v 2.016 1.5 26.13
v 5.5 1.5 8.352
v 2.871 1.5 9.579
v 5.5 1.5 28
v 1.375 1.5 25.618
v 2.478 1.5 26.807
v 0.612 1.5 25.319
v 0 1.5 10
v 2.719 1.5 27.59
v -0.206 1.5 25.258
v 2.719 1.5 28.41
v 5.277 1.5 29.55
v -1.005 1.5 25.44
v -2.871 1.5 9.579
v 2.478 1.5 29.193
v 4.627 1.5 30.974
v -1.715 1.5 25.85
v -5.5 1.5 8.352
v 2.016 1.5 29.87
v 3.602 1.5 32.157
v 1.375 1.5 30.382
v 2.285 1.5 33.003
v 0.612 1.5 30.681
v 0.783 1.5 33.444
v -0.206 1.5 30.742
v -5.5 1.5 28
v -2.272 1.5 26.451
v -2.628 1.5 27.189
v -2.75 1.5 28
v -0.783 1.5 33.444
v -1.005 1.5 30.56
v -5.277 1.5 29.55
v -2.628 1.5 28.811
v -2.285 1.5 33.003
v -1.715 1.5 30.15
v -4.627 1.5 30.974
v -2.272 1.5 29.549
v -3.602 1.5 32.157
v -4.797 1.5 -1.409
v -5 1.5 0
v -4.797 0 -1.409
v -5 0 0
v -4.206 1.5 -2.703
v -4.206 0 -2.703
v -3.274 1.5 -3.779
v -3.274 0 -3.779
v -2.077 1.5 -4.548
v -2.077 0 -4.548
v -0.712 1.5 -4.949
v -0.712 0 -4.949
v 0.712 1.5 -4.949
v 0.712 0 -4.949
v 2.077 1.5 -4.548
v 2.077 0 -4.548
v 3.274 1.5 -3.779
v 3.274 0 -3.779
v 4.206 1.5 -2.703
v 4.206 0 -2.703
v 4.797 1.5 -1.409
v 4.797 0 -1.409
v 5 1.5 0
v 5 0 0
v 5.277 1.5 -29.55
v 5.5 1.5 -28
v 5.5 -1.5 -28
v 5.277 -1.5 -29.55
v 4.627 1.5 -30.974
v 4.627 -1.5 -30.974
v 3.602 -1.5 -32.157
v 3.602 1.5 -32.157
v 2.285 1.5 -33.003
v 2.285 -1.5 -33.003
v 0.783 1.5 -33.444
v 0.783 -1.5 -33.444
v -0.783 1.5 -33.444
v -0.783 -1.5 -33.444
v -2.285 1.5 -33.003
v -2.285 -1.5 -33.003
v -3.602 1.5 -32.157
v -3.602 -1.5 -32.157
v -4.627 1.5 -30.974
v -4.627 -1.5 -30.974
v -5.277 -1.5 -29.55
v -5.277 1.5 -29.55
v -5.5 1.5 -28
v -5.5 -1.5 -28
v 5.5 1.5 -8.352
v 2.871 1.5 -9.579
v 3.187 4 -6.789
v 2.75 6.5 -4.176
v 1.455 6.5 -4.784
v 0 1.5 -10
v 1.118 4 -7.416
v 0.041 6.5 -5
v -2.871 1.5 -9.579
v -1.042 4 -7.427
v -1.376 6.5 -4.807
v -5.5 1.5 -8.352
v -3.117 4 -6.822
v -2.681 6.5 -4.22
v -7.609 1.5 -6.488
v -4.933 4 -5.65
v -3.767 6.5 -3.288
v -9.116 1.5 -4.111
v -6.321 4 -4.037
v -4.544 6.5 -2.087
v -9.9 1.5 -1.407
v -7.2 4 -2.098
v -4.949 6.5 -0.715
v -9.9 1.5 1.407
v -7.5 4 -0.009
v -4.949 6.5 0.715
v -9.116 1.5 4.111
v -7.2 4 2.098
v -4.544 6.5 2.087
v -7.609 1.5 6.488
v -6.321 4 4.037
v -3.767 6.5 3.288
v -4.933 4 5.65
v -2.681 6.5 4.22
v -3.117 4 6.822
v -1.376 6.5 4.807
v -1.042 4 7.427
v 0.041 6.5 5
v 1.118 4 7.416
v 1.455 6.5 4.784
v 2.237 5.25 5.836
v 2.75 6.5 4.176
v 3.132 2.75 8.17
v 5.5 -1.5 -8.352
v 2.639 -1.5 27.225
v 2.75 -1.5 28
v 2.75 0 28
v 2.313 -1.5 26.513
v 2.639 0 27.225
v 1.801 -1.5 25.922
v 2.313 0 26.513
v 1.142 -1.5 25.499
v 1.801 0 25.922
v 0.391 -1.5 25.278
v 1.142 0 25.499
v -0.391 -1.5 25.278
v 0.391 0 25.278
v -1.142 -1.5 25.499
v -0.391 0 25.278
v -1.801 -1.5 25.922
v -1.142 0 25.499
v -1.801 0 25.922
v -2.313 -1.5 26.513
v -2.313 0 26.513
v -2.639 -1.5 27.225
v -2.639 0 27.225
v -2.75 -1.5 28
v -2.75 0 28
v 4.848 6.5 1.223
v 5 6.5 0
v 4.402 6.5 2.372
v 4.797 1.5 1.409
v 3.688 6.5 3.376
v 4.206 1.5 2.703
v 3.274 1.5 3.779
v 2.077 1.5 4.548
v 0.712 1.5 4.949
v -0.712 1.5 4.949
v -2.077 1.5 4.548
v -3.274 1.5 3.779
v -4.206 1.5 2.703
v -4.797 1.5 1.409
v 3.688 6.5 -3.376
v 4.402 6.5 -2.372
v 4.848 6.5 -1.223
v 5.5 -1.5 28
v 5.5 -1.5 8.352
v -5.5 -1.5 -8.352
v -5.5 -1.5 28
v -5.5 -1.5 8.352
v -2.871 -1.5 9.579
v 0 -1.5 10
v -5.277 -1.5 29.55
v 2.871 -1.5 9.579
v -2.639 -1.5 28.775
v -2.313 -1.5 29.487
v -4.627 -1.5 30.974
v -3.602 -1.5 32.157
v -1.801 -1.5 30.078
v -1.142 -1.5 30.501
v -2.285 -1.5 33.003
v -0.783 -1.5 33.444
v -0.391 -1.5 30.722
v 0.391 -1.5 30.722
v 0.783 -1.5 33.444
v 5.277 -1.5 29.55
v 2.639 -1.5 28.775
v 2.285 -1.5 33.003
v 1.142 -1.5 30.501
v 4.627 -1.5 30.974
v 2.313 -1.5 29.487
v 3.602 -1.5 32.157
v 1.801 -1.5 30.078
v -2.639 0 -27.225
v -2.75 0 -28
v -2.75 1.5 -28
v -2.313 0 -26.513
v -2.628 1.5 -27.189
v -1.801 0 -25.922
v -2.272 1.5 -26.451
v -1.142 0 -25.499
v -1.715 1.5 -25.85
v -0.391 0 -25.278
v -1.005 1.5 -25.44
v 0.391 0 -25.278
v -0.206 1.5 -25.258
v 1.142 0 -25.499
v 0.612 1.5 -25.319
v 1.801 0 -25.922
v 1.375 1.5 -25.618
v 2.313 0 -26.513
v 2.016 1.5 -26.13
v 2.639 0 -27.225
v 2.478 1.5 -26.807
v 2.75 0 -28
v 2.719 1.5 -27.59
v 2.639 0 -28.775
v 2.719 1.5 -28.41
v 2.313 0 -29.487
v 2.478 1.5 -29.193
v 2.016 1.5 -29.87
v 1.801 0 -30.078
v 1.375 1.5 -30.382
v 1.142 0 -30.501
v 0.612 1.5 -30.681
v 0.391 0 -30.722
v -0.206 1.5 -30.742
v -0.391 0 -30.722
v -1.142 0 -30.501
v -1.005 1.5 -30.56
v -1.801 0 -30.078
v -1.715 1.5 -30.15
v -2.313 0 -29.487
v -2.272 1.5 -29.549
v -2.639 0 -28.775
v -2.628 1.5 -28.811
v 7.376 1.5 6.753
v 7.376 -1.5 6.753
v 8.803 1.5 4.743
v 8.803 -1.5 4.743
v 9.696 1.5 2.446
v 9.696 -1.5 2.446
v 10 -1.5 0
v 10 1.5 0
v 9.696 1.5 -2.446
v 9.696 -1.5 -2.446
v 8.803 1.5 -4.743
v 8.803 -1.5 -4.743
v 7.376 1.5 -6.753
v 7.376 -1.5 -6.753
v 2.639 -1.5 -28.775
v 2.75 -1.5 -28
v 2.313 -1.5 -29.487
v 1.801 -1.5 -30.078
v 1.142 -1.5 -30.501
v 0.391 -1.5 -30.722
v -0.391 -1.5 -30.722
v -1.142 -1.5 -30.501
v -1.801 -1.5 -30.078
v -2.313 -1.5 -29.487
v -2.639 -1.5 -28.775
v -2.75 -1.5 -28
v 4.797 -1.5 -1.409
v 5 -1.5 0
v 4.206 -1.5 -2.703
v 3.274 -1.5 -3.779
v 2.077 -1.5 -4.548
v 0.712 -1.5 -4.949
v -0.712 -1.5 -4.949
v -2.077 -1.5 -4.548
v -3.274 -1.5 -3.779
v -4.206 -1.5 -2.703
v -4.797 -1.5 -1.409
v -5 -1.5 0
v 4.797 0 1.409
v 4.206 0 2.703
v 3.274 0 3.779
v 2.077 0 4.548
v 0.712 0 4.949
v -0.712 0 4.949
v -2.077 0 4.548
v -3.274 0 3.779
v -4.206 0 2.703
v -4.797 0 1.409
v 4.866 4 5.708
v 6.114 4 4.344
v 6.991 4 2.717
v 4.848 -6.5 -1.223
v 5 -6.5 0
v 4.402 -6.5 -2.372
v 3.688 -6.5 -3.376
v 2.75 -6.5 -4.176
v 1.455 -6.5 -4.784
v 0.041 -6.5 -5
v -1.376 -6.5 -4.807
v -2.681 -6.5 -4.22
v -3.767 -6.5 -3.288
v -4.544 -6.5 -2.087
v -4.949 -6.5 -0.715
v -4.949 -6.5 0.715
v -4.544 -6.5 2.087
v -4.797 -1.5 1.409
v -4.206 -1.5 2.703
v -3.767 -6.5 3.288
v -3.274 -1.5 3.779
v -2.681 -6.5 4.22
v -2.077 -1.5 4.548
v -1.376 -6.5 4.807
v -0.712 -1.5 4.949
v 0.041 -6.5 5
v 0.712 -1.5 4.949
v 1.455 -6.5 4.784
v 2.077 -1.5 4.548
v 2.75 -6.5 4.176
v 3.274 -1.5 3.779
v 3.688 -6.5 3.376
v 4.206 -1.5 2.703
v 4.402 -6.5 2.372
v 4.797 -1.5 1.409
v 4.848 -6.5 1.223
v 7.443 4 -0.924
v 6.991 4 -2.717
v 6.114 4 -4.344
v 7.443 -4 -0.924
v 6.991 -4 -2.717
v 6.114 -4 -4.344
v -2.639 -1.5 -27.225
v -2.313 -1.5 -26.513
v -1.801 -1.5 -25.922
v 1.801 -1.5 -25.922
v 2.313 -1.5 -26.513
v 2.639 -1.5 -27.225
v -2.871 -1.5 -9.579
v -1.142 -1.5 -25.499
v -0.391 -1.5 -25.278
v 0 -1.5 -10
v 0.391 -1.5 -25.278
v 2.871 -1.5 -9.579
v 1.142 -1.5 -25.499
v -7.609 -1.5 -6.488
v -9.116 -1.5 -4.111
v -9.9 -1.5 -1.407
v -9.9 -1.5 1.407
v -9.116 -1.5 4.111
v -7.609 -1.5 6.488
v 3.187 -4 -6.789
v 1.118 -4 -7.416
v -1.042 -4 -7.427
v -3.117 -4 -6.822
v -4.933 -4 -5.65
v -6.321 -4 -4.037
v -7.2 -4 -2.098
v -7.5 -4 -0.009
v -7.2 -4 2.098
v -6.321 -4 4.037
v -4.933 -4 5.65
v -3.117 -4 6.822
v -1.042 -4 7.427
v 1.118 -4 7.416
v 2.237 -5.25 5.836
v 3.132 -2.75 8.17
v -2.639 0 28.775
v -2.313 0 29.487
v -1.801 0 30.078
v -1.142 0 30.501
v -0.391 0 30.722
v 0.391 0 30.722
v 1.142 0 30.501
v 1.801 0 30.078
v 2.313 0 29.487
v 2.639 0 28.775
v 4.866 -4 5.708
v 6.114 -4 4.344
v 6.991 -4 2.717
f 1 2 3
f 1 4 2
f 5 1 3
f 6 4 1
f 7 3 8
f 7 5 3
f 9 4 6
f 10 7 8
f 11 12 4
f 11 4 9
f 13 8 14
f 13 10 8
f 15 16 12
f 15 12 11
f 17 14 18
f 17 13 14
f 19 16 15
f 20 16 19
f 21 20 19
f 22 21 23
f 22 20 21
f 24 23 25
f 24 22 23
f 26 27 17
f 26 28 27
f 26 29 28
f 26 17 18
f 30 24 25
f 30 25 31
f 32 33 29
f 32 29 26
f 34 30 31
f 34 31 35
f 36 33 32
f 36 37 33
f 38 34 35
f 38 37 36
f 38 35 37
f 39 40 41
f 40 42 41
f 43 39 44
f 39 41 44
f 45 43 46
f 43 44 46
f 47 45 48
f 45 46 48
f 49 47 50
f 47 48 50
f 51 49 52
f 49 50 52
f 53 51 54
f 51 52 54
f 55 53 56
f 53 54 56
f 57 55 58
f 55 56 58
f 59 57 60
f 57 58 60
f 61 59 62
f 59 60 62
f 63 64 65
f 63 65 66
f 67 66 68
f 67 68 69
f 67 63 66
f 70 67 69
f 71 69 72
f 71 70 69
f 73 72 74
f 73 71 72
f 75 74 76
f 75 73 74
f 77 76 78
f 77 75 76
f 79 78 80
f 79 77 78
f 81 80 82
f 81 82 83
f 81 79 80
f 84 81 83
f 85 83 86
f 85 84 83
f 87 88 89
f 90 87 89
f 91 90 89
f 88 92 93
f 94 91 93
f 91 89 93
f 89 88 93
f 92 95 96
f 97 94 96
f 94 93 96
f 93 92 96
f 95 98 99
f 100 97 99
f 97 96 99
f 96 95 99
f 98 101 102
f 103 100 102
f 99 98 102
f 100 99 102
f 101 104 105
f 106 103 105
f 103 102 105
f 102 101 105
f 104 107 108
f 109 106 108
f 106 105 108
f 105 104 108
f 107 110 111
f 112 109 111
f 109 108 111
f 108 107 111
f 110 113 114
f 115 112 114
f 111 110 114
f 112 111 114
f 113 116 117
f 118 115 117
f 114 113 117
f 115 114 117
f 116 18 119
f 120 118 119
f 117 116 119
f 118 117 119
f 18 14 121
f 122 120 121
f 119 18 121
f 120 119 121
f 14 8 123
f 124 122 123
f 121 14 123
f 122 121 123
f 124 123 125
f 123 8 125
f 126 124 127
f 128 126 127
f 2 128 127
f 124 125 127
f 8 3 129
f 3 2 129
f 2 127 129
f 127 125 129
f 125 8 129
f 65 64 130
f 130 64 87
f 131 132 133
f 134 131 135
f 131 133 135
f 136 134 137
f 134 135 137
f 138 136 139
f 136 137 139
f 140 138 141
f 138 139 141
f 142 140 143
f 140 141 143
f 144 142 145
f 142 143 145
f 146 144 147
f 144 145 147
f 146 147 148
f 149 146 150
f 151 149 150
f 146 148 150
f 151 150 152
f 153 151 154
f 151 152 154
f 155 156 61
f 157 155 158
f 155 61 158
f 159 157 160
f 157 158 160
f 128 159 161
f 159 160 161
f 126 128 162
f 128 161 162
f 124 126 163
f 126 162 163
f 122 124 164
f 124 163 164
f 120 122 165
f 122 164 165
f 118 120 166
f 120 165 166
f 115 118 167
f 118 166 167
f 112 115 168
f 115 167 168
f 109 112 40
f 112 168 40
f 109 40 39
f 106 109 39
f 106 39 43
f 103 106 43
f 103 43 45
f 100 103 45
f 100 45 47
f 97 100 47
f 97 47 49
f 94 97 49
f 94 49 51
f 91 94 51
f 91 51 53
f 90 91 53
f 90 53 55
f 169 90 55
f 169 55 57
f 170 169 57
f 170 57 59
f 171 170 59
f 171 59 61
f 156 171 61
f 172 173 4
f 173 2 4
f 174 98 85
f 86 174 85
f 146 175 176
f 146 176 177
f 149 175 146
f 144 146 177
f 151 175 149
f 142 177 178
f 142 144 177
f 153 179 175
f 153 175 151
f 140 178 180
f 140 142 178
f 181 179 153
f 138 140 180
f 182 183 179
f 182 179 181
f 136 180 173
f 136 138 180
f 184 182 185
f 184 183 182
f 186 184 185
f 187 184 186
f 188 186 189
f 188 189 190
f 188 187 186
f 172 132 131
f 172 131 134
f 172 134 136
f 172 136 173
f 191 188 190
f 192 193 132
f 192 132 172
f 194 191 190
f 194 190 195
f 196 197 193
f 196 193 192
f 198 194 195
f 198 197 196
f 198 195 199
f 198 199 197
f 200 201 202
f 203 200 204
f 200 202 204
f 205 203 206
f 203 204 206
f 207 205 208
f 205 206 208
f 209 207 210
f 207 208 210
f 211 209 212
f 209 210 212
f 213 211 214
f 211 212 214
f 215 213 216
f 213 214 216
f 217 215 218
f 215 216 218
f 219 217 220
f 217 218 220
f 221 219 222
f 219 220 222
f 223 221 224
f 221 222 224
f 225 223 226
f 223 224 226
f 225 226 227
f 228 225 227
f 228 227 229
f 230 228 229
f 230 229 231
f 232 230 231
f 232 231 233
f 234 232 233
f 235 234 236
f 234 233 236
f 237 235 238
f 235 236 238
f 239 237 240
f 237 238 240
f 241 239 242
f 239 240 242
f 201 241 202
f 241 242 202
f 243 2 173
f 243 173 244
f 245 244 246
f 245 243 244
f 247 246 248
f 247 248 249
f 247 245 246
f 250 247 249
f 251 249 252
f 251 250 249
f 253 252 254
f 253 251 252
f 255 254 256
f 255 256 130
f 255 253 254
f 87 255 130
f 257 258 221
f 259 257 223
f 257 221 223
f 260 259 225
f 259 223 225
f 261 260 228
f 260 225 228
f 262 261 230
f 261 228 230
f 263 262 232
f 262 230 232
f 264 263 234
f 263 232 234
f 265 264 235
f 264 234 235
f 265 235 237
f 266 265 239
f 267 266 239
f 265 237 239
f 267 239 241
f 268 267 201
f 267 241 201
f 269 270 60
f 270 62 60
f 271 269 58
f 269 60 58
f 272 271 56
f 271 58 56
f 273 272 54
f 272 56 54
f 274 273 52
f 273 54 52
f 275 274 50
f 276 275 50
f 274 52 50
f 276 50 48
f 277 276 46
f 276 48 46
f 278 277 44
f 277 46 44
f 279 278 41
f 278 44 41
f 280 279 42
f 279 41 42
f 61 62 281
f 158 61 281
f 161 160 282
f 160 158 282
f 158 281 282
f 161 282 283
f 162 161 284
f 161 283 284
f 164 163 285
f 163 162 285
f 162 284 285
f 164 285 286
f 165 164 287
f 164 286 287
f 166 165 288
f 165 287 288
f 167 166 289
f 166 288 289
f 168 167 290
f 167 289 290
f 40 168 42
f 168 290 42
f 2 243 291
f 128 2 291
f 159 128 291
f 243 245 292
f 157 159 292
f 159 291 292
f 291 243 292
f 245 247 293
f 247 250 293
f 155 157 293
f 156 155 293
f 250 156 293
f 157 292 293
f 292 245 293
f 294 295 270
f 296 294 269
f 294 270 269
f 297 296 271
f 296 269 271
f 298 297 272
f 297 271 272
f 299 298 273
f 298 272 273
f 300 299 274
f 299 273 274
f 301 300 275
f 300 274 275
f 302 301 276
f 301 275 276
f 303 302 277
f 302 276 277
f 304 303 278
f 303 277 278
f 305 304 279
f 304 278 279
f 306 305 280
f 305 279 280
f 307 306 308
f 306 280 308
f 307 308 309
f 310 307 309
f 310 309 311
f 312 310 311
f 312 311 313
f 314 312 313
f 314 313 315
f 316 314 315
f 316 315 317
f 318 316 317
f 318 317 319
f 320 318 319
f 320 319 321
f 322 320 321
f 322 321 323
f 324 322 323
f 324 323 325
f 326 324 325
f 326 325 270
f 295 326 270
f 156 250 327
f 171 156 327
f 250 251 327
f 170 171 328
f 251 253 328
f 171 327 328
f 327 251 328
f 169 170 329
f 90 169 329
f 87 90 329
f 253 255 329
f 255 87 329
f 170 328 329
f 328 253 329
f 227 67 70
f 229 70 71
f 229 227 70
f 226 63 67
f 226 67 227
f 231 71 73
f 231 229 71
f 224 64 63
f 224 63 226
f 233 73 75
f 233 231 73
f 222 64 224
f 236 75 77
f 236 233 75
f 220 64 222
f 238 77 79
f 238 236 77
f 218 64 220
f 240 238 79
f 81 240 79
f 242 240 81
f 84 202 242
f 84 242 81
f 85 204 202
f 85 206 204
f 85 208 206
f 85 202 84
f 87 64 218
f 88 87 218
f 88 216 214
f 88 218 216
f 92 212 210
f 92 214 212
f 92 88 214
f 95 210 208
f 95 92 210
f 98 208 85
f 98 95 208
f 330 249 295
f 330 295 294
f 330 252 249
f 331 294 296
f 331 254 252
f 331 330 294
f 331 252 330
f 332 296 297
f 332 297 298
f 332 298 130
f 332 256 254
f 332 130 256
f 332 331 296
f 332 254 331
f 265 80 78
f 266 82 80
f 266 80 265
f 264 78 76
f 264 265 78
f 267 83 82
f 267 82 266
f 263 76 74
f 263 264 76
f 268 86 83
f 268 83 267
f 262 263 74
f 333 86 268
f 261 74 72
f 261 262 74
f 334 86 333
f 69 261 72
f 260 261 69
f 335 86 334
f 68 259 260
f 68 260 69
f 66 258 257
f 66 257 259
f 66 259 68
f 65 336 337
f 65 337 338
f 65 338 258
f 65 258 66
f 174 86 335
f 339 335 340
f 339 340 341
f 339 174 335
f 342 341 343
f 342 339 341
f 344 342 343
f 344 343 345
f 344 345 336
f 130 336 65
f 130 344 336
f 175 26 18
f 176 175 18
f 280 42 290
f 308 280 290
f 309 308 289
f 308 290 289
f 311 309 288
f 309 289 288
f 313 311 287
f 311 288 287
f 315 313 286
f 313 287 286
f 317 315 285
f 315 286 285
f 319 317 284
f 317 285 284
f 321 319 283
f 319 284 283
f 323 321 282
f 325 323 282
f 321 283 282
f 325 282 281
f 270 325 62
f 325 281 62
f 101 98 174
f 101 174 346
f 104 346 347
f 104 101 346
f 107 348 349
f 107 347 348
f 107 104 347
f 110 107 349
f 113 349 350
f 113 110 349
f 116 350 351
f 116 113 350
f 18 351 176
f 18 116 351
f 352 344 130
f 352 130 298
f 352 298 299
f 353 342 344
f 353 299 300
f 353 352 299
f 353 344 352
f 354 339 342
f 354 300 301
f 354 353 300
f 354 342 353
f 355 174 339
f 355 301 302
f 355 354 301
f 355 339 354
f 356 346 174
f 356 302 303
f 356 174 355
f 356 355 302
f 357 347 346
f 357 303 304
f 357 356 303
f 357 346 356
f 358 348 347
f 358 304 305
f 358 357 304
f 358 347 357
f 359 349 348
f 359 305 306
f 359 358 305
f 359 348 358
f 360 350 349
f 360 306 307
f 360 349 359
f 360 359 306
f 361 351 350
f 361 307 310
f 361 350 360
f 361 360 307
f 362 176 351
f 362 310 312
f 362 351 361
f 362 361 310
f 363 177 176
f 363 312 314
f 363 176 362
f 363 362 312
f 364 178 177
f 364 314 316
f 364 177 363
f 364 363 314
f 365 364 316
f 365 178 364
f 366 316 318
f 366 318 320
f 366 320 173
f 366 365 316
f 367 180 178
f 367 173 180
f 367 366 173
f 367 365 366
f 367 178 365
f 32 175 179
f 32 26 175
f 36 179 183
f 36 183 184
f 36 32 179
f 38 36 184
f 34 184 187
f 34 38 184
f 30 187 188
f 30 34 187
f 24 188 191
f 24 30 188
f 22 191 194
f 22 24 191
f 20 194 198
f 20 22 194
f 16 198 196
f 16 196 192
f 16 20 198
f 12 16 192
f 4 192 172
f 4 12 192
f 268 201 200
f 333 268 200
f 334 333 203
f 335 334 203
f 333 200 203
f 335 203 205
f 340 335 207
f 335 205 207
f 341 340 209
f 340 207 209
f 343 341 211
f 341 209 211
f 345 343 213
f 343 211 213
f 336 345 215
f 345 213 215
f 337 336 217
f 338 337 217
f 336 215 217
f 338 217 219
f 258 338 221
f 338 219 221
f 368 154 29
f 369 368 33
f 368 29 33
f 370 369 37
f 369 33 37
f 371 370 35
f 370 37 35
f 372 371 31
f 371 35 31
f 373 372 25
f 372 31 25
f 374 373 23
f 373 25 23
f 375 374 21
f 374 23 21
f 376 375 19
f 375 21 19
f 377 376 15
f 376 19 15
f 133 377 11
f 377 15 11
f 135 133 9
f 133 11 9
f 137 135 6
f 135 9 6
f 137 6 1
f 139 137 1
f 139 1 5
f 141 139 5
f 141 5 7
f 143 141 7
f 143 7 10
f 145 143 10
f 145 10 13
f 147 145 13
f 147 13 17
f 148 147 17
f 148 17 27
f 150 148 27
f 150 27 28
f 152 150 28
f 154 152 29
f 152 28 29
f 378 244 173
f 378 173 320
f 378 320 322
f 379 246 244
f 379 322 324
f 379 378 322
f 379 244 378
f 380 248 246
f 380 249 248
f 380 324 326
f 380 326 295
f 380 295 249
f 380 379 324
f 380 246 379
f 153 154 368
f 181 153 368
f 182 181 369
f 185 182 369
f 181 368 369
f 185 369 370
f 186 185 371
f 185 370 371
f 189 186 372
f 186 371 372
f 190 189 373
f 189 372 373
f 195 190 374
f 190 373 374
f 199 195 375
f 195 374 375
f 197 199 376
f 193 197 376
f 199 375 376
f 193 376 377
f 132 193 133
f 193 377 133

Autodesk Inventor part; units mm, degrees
ref_plane "YZ Plane" through (0, 0, 0) normal (1, 0, 0) x (0, 1, 0)
ref_plane "XZ Plane" through (0, 0, 0) normal (0, 1, 0) x (-1, 0, 0)
ref_plane "XY Plane" through (0, 0, 0) normal (0, 0, 1) x (1, 0, 0)
sketch "Sketch1" plane through (0, 0, 0) normal (0, 1, 0) x (-1, 0, 0)
  circle A0 centre (0, 0) radius 10
  line L0 (0, 28) -> (0, -28) construction
  line L1 (-5.5, 28) -> (-5.5, -28)
  line L2 (5.5, -28) -> (5.5, 28)
  arc A1 (5.5, 28) -> (-5.5, 28) centre (0, 28) ccw
  arc A2 (-5.5, -28) -> (5.5, -28) centre (0, -28) ccw
  circle A3 centre (0, 0) radius 5
  circle A4 centre (0, 28) radius 2.75
  circle A5 centre (0, -28) radius 2.75
  point P0 (-5.5, 8.3516)
  point P1 (-5.5, -8.3516)
  point P2 (5.5, -8.3516)
  point P3 (5.5, 8.3516)
  dimension "d0" = 56
  dimension "d1" = 20
  dimension "d2" = 10
  dimension "d3" = 5.5
  dimension "d4" = 5.5
extrude "Extrusion1" add sketch "Sketch1" along normal blind 1.5
ref_plane "Work Plane1" through (0, 6.5, 0) normal (0, 1, 0) x (1, 0, 0)
sketch "Sketch4" plane through (0, 1.5, 0) normal (0, 1, 0) x (1, 0, 0)
  arc A0 (5.5, -8.3516) -> (5.5, 8.3516) centre (0, 0) ccw projected
  circle A1 centre (0, 0) radius 10
sketch "Sketch2" plane through (0, 6.5, 0) normal (0, 1, 0) x (1, 0, 0)
  circle A0 centre (0, 0) radius 5 projected
  circle A1 centre (0, 0) radius 5
loft "Loft2" add profiles "Sketch2", "Sketch4"
sketch "Sketch3" plane through (0, 0, 0) normal (0, -1, 0) x (1, 0, 0)
  circle A0 centre (0, 0) radius 5 projected
  circle A1 centre (0, 28) radius 2.75 projected
  circle A2 centre (0, -28) radius 2.75 projected
extrude "Extrusion2" cut sketch "Sketch3" against normal through all
mirror "Mirror1" about plane through (0, 0, 0) normal (0, -1, 0) of "Extrusion1", "Loft2", "Extrusion2"
properties part number "12_Thong_lo_xo"
